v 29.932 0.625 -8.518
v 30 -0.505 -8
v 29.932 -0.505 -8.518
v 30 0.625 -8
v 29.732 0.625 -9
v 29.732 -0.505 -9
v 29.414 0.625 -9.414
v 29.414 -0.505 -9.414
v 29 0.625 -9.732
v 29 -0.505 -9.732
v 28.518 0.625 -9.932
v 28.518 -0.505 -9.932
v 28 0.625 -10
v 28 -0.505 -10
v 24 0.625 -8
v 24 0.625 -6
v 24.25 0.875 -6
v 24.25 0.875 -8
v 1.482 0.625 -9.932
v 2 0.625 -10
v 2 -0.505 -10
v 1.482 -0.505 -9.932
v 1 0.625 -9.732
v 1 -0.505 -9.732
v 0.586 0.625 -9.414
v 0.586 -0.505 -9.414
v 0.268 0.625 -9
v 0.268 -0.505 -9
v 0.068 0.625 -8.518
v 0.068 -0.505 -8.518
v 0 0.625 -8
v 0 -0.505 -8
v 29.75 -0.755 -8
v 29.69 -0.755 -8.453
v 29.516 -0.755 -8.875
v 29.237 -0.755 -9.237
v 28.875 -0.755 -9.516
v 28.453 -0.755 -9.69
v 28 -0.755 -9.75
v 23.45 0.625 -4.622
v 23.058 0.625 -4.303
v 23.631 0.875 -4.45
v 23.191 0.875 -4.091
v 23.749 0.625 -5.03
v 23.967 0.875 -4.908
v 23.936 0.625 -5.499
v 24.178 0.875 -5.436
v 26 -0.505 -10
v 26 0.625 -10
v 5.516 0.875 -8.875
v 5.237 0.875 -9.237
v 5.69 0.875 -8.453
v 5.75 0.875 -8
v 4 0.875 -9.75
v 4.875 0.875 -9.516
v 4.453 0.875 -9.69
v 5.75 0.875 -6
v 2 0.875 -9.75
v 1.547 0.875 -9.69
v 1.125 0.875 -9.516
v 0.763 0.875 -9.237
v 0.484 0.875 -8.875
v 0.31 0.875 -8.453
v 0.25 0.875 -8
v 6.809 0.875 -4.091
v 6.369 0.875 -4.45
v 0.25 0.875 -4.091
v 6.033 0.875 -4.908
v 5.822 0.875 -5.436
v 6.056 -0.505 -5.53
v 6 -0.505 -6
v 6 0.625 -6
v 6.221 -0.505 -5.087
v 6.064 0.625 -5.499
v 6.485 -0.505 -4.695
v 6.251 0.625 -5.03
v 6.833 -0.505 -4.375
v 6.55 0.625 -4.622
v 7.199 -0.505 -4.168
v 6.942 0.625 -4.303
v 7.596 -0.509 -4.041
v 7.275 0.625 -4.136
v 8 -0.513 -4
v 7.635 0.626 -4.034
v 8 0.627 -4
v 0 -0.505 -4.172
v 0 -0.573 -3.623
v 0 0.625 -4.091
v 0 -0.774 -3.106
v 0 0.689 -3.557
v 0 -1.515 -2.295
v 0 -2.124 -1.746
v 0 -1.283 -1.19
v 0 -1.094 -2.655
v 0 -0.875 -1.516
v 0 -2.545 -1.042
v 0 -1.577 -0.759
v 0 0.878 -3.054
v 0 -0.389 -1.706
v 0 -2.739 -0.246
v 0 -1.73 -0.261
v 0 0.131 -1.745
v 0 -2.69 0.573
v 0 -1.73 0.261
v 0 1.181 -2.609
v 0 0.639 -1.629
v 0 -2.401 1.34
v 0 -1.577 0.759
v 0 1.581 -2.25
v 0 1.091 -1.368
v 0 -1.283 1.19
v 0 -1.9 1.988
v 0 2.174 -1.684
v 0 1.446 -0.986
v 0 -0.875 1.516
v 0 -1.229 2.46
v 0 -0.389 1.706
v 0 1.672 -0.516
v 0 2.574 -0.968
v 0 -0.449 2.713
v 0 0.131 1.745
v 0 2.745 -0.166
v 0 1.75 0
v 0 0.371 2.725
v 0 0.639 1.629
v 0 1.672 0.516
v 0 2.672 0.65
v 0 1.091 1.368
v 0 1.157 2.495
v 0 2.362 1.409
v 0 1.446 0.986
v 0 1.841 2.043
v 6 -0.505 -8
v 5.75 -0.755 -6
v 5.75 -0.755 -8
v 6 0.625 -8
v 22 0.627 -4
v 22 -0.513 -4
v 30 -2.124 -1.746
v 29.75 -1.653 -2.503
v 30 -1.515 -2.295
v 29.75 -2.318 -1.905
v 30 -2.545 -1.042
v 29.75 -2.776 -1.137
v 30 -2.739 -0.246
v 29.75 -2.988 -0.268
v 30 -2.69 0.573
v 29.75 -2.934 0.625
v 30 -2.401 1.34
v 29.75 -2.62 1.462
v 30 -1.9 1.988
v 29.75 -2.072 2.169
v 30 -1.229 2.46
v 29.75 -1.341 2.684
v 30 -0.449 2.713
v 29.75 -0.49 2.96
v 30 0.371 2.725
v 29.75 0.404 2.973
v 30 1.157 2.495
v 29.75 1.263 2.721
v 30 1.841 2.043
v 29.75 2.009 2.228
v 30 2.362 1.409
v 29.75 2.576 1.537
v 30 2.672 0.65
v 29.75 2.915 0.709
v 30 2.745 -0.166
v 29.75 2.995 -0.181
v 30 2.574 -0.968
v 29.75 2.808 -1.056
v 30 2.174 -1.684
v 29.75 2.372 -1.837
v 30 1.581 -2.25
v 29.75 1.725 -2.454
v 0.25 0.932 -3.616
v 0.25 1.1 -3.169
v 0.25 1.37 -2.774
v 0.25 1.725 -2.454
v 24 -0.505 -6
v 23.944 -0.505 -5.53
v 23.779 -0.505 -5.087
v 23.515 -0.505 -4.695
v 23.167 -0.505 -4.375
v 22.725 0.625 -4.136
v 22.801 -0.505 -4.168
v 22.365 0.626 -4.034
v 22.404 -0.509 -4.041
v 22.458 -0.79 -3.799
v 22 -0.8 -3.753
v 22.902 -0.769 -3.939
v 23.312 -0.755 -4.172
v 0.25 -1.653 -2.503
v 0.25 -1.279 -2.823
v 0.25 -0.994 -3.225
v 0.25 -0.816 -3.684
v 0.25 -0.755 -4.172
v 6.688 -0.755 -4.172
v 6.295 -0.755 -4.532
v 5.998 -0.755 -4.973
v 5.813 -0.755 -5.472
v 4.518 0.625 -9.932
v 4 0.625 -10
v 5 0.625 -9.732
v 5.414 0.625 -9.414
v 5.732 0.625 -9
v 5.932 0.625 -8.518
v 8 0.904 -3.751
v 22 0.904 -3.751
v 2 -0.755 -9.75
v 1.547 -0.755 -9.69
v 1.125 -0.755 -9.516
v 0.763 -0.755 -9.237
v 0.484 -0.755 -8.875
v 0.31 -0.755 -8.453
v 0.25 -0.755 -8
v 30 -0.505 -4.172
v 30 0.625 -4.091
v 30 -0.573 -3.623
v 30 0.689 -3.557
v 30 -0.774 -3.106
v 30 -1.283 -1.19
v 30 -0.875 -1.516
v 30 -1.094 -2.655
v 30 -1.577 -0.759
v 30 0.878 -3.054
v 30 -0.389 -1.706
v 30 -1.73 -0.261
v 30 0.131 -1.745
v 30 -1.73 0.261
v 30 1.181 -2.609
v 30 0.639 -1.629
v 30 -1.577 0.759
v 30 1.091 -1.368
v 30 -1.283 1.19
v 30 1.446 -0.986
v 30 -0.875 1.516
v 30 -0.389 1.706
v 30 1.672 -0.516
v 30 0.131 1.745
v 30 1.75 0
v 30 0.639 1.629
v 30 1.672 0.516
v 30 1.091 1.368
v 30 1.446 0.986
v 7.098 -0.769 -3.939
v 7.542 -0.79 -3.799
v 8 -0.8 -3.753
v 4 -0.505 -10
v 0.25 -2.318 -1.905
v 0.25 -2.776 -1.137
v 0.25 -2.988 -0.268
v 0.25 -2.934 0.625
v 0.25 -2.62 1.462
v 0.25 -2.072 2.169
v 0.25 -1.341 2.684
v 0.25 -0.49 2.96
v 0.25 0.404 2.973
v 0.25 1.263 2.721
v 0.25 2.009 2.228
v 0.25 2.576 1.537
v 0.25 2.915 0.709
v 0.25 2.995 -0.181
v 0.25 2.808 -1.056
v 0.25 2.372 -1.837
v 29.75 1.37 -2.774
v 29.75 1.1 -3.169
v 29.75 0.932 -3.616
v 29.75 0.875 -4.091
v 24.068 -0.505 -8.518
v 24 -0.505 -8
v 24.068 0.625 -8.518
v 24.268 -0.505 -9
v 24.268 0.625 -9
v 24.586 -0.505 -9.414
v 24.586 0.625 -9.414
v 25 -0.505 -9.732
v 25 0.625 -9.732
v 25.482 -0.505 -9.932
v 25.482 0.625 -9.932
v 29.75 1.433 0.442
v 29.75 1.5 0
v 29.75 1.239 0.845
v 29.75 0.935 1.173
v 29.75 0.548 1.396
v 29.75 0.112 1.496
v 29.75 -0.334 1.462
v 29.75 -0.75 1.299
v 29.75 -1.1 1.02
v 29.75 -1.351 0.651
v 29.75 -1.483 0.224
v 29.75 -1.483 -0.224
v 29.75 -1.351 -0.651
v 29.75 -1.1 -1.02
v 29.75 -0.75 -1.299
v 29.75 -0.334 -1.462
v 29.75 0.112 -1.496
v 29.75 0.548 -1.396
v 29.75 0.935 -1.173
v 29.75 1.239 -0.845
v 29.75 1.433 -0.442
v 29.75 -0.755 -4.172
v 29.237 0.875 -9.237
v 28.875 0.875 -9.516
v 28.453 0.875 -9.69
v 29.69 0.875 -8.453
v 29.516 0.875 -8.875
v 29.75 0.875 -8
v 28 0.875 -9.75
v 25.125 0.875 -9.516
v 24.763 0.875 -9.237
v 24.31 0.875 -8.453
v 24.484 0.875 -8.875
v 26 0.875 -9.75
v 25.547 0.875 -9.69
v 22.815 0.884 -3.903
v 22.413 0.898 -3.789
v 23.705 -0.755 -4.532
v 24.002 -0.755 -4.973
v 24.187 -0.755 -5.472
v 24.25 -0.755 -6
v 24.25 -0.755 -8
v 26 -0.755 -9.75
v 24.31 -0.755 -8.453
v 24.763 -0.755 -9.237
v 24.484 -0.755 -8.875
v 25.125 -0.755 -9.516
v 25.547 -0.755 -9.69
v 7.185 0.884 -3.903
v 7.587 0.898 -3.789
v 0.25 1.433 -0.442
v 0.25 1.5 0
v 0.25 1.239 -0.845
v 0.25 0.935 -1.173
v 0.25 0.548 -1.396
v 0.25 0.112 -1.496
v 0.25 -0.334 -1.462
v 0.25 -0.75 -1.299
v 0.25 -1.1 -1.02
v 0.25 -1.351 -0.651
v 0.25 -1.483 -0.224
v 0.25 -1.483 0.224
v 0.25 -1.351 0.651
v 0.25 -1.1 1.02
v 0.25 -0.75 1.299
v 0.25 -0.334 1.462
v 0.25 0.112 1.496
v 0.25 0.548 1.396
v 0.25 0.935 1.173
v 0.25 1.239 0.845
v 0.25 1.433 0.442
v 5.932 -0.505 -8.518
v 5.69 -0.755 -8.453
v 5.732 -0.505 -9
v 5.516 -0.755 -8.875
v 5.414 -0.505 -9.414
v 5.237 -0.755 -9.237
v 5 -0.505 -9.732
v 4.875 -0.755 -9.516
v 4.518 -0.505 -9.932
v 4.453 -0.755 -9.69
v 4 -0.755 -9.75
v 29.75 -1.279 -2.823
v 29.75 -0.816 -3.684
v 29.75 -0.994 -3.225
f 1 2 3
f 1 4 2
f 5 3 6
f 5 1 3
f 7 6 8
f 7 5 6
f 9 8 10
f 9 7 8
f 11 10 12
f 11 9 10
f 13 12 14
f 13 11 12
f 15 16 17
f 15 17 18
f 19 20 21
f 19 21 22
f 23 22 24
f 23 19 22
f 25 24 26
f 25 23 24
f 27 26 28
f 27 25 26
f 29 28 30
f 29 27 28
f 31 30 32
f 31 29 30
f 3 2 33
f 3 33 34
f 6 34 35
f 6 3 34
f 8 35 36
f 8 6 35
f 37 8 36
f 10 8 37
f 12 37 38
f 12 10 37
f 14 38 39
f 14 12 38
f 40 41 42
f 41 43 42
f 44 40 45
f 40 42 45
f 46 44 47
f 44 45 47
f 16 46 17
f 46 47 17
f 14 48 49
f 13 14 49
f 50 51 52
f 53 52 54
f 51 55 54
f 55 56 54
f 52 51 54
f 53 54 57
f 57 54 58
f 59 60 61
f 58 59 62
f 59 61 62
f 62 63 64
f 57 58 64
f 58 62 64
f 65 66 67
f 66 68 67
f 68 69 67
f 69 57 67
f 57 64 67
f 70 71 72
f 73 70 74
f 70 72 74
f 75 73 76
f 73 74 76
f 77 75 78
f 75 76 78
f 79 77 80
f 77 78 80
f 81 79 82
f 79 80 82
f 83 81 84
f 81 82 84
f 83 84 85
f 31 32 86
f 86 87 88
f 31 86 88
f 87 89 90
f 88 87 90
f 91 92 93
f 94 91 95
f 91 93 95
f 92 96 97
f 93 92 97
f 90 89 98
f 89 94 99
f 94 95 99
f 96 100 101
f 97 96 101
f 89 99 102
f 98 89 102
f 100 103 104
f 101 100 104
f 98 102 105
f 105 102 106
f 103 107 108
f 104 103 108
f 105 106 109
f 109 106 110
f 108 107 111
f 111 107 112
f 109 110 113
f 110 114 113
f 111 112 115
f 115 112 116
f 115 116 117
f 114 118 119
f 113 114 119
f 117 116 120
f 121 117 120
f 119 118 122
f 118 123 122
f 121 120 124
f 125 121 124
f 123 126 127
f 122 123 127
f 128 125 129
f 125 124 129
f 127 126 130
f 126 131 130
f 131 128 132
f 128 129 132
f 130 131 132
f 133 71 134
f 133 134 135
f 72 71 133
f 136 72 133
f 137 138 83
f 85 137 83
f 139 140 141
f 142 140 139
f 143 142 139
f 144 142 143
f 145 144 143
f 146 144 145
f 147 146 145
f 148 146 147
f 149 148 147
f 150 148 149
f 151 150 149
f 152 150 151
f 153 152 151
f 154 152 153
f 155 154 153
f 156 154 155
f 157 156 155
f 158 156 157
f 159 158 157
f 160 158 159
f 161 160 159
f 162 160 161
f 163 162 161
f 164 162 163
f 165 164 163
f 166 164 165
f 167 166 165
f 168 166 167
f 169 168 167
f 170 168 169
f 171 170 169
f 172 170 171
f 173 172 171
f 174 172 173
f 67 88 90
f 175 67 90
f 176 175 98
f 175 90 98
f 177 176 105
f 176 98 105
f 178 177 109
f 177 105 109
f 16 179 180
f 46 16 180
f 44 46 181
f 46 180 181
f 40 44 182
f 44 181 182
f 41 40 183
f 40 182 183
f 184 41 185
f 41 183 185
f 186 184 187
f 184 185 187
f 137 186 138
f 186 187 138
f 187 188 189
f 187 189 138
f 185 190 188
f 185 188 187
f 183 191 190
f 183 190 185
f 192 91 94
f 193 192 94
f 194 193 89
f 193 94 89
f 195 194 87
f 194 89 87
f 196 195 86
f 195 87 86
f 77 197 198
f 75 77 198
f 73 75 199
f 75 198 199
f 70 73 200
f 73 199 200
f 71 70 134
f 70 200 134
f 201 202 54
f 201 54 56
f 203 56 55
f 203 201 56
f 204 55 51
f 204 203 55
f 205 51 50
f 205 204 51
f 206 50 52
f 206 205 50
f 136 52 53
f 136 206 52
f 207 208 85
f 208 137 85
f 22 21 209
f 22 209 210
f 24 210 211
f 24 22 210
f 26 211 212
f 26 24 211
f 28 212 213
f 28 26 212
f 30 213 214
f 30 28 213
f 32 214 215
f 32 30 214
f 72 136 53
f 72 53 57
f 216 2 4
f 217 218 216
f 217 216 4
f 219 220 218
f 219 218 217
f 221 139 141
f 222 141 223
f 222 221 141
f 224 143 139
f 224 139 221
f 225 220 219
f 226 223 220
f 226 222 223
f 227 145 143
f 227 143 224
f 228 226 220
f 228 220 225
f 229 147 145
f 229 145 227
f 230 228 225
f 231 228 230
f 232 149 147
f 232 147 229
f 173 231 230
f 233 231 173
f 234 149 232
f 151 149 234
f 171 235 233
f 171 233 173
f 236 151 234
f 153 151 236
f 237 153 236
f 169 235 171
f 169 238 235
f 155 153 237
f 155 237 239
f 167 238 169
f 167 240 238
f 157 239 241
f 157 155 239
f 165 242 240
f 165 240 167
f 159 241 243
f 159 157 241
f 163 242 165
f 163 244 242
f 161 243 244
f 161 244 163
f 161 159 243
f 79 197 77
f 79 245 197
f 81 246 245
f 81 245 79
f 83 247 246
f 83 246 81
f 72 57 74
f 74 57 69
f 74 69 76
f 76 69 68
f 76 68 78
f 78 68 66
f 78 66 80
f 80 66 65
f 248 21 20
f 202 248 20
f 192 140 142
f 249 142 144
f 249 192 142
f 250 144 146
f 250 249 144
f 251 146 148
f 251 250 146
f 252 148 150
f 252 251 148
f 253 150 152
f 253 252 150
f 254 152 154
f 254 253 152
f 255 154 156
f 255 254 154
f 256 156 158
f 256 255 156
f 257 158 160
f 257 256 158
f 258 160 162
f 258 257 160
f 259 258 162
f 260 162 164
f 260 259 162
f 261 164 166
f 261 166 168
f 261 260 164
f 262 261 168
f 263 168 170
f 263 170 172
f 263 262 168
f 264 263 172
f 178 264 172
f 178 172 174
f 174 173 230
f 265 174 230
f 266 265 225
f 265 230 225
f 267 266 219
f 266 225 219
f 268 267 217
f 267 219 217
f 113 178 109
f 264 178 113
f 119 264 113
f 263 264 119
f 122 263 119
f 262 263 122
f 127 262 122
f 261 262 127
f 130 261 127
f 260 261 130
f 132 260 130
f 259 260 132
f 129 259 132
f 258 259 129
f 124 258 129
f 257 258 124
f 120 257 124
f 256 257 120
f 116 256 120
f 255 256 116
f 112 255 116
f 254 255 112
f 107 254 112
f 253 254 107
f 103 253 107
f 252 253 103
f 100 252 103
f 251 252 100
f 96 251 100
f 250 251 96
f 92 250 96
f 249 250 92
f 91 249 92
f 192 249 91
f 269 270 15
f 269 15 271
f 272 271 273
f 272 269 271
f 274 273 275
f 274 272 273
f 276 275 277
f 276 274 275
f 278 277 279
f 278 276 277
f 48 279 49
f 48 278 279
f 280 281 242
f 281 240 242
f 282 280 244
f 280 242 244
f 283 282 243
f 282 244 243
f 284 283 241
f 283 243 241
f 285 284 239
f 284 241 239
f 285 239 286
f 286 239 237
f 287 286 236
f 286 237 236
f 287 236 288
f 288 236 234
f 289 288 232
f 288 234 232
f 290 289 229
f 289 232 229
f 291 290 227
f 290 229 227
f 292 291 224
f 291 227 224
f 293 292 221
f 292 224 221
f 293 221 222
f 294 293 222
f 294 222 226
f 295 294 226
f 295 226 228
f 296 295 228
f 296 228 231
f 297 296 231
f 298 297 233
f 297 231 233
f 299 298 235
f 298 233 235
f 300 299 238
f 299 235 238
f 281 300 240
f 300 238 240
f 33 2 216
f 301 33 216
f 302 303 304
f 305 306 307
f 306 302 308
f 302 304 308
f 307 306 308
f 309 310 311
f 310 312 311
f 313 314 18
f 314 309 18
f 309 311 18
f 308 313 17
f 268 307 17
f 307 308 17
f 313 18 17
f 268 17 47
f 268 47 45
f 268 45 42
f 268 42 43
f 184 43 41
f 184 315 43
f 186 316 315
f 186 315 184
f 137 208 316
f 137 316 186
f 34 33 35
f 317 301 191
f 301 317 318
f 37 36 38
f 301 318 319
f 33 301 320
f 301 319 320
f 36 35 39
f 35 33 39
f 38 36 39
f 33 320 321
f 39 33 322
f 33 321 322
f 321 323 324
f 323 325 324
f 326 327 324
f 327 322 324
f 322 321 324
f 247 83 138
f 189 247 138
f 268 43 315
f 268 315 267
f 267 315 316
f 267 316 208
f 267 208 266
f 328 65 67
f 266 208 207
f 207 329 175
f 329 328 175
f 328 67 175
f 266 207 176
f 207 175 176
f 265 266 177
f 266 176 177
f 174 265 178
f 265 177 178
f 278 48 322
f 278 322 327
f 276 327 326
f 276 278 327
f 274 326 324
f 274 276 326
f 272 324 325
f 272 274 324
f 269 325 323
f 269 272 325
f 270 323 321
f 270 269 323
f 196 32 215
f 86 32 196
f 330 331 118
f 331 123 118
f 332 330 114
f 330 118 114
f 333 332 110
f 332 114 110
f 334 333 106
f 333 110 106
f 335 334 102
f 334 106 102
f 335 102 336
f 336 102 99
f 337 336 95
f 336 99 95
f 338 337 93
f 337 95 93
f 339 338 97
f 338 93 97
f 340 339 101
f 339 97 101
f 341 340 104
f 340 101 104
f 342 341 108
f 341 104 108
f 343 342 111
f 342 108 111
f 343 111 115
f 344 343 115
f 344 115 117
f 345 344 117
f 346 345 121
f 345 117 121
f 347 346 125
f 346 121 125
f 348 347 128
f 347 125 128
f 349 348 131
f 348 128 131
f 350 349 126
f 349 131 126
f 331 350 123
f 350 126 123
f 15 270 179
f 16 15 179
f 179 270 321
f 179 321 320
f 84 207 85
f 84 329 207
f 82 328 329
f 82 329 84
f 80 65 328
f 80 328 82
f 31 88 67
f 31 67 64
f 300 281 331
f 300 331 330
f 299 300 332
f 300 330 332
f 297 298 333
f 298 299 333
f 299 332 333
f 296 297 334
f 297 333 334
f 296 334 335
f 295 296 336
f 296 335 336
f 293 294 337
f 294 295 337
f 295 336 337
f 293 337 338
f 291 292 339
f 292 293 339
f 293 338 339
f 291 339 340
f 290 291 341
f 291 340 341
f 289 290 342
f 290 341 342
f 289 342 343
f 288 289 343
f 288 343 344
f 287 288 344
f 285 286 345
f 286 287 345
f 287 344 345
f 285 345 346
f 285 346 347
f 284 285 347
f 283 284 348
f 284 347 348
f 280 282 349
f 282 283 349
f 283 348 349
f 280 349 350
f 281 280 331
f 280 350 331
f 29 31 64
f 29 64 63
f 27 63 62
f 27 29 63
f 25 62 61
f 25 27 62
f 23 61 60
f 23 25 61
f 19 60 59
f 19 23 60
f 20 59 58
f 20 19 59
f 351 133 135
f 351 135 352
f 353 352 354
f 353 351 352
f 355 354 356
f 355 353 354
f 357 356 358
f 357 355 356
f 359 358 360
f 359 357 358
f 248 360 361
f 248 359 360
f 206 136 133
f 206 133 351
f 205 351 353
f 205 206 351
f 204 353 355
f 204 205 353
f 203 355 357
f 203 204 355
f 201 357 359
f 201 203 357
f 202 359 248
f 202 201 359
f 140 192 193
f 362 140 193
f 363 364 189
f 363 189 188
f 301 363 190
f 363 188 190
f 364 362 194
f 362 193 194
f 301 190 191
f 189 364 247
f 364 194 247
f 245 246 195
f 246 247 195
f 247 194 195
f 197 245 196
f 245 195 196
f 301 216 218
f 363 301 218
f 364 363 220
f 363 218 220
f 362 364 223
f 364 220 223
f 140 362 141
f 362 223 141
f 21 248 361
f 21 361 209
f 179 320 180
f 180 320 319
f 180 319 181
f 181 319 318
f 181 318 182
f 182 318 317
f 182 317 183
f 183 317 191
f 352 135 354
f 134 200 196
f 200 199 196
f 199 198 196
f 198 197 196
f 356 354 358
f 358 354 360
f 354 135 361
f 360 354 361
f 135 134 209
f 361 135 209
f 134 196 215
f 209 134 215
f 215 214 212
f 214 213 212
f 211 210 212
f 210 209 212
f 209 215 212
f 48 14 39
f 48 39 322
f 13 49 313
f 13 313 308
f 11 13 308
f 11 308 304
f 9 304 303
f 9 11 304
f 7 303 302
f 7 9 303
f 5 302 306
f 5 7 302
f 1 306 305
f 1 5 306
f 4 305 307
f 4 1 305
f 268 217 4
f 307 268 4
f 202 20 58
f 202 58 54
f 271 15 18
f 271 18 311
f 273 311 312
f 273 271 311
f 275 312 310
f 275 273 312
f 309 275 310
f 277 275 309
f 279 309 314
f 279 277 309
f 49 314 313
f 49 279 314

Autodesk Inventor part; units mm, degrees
ref_plane "YZ Plane" through (0, 0, 0) normal (1, 0, 0) x (0, 1, 0)
ref_plane "XZ Plane" through (0, 0, 0) normal (0, 1, 0) x (-1, 0, 0)
ref_plane "XY Plane" through (0, 0, 0) normal (0, 0, 1) x (1, 0, 0)
sketch "Sketch3" plane through (0, 0, 0) normal (1, 0, 0) x (0, 1, 0)
  circle A0 centre (0, 0) radius 1.5
  arc A1 (1.725, -2.4545) -> (-1.6531, -2.5034) centre (0, 0) ccw
  line L0 (-0.7552, -4.1724) -> (-0.7552, -10)
  line L1 (-0.7552, -10) -> (0.875, -10)
  line L2 (0.875, -10) -> (0.875, -4.0908)
  arc A2 (1.725, -2.4545) -> (0.875, -4.0908) centre (2.875, -4.0908) ccw
  arc A3 (-0.7552, -4.1724) -> (-1.6531, -2.5034) centre (-2.7552, -4.1724) ccw
  dimension "d4" = 3
  dimension "d5" = 6
  dimension "d7" = 2
extrude "Extrusion2" add sketch "Sketch3" along normal blind 30
sketch "Sketch5" plane through (0, 0.875, -4.0908) normal (0, 1, 0) x (1, 0, 0)
  line L0 (0, 5.9092) -> (30, 5.9092) projected
  line L1 (6, 5.9092) -> (24, 5.9092)
  line L2 (24, 5.9092) -> (24, -0.0908)
  line L3 (24, -0.0908) -> (6, -0.0908)
  line L4 (6, -0.0908) -> (6, 5.9092)
  line L5 (0, 5.9092) -> (0, 0) projected
  point P0 (0, -4.0908)
  dimension "d18" = 6
  dimension "d19" = 30
  dimension "d20" = 6
  dimension "d21" = 18
extrude "Extrusion3" cut sketch "Sketch5" along normal blind 0.5 and the other way blind 2
fillet "Fillet1" radius 2 6 edges at (6, 0.0599, -10) (24, 0.0599, -10) (30, 0.0599, -10) (0, 0.0599, -10) (24, 0.0572, -4) (6, 0.0572, -4)
chamfer "Chamfer2" distance 0.25 angle 45 38 edges at (5.4142, 0.875, -9.4142) (6, 0.875, -7) (6.3889, 0.875, -4.815) (7.6998, 0.8762, -4.0227) (15, 0.8771, -4) (22.3002, 0.8762, -4.0227) (23.6111, 0.875, -4.815) (24, 0.875, -7) (24.5858, 0.875, -9.4142) (27, 0.875, -10) (29.4142, 0.875, -9.4142) (30, 0.875, -6.0454) (30, 1.1002, -3.1688) (30, -0.0435, 2.9997) (30, -0.9939, -3.2248) (30, -0.7552, -6.0862) (29.4142, -0.7552, -9.4142) (27, -0.7552, -10) (24.5858, -0.7552, -9.4142) (24, -0.7552, -7) (23.677, -0.7552, -4.9102) (22.4123, -0.7594, -4.043) (15, -0.7626, -4) (7.5877, -0.7594, -4.043) (6.323, -0.7552, -4.9102) (6, -0.7552, -7) (5.4142, -0.7552, -9.4142) (3, -0.7552, -10) (0.5858, -0.7552, -9.4142) (0, -0.7552, -6.0862) (0, -0.9939, -3.2248) (0, -0.0435, 2.9997) (0, 1.1002, -3.1688) (0, 0.875, -6.0454) (0.5858, 0.875, -9.4142) (3, 0.875, -10) (30, -1.5, 0) (0, -1.5, 0)
equation "\"d20\" = -0.5 * d21 + 0.5 * d19"
properties part number "CoinLockUpperRow"
